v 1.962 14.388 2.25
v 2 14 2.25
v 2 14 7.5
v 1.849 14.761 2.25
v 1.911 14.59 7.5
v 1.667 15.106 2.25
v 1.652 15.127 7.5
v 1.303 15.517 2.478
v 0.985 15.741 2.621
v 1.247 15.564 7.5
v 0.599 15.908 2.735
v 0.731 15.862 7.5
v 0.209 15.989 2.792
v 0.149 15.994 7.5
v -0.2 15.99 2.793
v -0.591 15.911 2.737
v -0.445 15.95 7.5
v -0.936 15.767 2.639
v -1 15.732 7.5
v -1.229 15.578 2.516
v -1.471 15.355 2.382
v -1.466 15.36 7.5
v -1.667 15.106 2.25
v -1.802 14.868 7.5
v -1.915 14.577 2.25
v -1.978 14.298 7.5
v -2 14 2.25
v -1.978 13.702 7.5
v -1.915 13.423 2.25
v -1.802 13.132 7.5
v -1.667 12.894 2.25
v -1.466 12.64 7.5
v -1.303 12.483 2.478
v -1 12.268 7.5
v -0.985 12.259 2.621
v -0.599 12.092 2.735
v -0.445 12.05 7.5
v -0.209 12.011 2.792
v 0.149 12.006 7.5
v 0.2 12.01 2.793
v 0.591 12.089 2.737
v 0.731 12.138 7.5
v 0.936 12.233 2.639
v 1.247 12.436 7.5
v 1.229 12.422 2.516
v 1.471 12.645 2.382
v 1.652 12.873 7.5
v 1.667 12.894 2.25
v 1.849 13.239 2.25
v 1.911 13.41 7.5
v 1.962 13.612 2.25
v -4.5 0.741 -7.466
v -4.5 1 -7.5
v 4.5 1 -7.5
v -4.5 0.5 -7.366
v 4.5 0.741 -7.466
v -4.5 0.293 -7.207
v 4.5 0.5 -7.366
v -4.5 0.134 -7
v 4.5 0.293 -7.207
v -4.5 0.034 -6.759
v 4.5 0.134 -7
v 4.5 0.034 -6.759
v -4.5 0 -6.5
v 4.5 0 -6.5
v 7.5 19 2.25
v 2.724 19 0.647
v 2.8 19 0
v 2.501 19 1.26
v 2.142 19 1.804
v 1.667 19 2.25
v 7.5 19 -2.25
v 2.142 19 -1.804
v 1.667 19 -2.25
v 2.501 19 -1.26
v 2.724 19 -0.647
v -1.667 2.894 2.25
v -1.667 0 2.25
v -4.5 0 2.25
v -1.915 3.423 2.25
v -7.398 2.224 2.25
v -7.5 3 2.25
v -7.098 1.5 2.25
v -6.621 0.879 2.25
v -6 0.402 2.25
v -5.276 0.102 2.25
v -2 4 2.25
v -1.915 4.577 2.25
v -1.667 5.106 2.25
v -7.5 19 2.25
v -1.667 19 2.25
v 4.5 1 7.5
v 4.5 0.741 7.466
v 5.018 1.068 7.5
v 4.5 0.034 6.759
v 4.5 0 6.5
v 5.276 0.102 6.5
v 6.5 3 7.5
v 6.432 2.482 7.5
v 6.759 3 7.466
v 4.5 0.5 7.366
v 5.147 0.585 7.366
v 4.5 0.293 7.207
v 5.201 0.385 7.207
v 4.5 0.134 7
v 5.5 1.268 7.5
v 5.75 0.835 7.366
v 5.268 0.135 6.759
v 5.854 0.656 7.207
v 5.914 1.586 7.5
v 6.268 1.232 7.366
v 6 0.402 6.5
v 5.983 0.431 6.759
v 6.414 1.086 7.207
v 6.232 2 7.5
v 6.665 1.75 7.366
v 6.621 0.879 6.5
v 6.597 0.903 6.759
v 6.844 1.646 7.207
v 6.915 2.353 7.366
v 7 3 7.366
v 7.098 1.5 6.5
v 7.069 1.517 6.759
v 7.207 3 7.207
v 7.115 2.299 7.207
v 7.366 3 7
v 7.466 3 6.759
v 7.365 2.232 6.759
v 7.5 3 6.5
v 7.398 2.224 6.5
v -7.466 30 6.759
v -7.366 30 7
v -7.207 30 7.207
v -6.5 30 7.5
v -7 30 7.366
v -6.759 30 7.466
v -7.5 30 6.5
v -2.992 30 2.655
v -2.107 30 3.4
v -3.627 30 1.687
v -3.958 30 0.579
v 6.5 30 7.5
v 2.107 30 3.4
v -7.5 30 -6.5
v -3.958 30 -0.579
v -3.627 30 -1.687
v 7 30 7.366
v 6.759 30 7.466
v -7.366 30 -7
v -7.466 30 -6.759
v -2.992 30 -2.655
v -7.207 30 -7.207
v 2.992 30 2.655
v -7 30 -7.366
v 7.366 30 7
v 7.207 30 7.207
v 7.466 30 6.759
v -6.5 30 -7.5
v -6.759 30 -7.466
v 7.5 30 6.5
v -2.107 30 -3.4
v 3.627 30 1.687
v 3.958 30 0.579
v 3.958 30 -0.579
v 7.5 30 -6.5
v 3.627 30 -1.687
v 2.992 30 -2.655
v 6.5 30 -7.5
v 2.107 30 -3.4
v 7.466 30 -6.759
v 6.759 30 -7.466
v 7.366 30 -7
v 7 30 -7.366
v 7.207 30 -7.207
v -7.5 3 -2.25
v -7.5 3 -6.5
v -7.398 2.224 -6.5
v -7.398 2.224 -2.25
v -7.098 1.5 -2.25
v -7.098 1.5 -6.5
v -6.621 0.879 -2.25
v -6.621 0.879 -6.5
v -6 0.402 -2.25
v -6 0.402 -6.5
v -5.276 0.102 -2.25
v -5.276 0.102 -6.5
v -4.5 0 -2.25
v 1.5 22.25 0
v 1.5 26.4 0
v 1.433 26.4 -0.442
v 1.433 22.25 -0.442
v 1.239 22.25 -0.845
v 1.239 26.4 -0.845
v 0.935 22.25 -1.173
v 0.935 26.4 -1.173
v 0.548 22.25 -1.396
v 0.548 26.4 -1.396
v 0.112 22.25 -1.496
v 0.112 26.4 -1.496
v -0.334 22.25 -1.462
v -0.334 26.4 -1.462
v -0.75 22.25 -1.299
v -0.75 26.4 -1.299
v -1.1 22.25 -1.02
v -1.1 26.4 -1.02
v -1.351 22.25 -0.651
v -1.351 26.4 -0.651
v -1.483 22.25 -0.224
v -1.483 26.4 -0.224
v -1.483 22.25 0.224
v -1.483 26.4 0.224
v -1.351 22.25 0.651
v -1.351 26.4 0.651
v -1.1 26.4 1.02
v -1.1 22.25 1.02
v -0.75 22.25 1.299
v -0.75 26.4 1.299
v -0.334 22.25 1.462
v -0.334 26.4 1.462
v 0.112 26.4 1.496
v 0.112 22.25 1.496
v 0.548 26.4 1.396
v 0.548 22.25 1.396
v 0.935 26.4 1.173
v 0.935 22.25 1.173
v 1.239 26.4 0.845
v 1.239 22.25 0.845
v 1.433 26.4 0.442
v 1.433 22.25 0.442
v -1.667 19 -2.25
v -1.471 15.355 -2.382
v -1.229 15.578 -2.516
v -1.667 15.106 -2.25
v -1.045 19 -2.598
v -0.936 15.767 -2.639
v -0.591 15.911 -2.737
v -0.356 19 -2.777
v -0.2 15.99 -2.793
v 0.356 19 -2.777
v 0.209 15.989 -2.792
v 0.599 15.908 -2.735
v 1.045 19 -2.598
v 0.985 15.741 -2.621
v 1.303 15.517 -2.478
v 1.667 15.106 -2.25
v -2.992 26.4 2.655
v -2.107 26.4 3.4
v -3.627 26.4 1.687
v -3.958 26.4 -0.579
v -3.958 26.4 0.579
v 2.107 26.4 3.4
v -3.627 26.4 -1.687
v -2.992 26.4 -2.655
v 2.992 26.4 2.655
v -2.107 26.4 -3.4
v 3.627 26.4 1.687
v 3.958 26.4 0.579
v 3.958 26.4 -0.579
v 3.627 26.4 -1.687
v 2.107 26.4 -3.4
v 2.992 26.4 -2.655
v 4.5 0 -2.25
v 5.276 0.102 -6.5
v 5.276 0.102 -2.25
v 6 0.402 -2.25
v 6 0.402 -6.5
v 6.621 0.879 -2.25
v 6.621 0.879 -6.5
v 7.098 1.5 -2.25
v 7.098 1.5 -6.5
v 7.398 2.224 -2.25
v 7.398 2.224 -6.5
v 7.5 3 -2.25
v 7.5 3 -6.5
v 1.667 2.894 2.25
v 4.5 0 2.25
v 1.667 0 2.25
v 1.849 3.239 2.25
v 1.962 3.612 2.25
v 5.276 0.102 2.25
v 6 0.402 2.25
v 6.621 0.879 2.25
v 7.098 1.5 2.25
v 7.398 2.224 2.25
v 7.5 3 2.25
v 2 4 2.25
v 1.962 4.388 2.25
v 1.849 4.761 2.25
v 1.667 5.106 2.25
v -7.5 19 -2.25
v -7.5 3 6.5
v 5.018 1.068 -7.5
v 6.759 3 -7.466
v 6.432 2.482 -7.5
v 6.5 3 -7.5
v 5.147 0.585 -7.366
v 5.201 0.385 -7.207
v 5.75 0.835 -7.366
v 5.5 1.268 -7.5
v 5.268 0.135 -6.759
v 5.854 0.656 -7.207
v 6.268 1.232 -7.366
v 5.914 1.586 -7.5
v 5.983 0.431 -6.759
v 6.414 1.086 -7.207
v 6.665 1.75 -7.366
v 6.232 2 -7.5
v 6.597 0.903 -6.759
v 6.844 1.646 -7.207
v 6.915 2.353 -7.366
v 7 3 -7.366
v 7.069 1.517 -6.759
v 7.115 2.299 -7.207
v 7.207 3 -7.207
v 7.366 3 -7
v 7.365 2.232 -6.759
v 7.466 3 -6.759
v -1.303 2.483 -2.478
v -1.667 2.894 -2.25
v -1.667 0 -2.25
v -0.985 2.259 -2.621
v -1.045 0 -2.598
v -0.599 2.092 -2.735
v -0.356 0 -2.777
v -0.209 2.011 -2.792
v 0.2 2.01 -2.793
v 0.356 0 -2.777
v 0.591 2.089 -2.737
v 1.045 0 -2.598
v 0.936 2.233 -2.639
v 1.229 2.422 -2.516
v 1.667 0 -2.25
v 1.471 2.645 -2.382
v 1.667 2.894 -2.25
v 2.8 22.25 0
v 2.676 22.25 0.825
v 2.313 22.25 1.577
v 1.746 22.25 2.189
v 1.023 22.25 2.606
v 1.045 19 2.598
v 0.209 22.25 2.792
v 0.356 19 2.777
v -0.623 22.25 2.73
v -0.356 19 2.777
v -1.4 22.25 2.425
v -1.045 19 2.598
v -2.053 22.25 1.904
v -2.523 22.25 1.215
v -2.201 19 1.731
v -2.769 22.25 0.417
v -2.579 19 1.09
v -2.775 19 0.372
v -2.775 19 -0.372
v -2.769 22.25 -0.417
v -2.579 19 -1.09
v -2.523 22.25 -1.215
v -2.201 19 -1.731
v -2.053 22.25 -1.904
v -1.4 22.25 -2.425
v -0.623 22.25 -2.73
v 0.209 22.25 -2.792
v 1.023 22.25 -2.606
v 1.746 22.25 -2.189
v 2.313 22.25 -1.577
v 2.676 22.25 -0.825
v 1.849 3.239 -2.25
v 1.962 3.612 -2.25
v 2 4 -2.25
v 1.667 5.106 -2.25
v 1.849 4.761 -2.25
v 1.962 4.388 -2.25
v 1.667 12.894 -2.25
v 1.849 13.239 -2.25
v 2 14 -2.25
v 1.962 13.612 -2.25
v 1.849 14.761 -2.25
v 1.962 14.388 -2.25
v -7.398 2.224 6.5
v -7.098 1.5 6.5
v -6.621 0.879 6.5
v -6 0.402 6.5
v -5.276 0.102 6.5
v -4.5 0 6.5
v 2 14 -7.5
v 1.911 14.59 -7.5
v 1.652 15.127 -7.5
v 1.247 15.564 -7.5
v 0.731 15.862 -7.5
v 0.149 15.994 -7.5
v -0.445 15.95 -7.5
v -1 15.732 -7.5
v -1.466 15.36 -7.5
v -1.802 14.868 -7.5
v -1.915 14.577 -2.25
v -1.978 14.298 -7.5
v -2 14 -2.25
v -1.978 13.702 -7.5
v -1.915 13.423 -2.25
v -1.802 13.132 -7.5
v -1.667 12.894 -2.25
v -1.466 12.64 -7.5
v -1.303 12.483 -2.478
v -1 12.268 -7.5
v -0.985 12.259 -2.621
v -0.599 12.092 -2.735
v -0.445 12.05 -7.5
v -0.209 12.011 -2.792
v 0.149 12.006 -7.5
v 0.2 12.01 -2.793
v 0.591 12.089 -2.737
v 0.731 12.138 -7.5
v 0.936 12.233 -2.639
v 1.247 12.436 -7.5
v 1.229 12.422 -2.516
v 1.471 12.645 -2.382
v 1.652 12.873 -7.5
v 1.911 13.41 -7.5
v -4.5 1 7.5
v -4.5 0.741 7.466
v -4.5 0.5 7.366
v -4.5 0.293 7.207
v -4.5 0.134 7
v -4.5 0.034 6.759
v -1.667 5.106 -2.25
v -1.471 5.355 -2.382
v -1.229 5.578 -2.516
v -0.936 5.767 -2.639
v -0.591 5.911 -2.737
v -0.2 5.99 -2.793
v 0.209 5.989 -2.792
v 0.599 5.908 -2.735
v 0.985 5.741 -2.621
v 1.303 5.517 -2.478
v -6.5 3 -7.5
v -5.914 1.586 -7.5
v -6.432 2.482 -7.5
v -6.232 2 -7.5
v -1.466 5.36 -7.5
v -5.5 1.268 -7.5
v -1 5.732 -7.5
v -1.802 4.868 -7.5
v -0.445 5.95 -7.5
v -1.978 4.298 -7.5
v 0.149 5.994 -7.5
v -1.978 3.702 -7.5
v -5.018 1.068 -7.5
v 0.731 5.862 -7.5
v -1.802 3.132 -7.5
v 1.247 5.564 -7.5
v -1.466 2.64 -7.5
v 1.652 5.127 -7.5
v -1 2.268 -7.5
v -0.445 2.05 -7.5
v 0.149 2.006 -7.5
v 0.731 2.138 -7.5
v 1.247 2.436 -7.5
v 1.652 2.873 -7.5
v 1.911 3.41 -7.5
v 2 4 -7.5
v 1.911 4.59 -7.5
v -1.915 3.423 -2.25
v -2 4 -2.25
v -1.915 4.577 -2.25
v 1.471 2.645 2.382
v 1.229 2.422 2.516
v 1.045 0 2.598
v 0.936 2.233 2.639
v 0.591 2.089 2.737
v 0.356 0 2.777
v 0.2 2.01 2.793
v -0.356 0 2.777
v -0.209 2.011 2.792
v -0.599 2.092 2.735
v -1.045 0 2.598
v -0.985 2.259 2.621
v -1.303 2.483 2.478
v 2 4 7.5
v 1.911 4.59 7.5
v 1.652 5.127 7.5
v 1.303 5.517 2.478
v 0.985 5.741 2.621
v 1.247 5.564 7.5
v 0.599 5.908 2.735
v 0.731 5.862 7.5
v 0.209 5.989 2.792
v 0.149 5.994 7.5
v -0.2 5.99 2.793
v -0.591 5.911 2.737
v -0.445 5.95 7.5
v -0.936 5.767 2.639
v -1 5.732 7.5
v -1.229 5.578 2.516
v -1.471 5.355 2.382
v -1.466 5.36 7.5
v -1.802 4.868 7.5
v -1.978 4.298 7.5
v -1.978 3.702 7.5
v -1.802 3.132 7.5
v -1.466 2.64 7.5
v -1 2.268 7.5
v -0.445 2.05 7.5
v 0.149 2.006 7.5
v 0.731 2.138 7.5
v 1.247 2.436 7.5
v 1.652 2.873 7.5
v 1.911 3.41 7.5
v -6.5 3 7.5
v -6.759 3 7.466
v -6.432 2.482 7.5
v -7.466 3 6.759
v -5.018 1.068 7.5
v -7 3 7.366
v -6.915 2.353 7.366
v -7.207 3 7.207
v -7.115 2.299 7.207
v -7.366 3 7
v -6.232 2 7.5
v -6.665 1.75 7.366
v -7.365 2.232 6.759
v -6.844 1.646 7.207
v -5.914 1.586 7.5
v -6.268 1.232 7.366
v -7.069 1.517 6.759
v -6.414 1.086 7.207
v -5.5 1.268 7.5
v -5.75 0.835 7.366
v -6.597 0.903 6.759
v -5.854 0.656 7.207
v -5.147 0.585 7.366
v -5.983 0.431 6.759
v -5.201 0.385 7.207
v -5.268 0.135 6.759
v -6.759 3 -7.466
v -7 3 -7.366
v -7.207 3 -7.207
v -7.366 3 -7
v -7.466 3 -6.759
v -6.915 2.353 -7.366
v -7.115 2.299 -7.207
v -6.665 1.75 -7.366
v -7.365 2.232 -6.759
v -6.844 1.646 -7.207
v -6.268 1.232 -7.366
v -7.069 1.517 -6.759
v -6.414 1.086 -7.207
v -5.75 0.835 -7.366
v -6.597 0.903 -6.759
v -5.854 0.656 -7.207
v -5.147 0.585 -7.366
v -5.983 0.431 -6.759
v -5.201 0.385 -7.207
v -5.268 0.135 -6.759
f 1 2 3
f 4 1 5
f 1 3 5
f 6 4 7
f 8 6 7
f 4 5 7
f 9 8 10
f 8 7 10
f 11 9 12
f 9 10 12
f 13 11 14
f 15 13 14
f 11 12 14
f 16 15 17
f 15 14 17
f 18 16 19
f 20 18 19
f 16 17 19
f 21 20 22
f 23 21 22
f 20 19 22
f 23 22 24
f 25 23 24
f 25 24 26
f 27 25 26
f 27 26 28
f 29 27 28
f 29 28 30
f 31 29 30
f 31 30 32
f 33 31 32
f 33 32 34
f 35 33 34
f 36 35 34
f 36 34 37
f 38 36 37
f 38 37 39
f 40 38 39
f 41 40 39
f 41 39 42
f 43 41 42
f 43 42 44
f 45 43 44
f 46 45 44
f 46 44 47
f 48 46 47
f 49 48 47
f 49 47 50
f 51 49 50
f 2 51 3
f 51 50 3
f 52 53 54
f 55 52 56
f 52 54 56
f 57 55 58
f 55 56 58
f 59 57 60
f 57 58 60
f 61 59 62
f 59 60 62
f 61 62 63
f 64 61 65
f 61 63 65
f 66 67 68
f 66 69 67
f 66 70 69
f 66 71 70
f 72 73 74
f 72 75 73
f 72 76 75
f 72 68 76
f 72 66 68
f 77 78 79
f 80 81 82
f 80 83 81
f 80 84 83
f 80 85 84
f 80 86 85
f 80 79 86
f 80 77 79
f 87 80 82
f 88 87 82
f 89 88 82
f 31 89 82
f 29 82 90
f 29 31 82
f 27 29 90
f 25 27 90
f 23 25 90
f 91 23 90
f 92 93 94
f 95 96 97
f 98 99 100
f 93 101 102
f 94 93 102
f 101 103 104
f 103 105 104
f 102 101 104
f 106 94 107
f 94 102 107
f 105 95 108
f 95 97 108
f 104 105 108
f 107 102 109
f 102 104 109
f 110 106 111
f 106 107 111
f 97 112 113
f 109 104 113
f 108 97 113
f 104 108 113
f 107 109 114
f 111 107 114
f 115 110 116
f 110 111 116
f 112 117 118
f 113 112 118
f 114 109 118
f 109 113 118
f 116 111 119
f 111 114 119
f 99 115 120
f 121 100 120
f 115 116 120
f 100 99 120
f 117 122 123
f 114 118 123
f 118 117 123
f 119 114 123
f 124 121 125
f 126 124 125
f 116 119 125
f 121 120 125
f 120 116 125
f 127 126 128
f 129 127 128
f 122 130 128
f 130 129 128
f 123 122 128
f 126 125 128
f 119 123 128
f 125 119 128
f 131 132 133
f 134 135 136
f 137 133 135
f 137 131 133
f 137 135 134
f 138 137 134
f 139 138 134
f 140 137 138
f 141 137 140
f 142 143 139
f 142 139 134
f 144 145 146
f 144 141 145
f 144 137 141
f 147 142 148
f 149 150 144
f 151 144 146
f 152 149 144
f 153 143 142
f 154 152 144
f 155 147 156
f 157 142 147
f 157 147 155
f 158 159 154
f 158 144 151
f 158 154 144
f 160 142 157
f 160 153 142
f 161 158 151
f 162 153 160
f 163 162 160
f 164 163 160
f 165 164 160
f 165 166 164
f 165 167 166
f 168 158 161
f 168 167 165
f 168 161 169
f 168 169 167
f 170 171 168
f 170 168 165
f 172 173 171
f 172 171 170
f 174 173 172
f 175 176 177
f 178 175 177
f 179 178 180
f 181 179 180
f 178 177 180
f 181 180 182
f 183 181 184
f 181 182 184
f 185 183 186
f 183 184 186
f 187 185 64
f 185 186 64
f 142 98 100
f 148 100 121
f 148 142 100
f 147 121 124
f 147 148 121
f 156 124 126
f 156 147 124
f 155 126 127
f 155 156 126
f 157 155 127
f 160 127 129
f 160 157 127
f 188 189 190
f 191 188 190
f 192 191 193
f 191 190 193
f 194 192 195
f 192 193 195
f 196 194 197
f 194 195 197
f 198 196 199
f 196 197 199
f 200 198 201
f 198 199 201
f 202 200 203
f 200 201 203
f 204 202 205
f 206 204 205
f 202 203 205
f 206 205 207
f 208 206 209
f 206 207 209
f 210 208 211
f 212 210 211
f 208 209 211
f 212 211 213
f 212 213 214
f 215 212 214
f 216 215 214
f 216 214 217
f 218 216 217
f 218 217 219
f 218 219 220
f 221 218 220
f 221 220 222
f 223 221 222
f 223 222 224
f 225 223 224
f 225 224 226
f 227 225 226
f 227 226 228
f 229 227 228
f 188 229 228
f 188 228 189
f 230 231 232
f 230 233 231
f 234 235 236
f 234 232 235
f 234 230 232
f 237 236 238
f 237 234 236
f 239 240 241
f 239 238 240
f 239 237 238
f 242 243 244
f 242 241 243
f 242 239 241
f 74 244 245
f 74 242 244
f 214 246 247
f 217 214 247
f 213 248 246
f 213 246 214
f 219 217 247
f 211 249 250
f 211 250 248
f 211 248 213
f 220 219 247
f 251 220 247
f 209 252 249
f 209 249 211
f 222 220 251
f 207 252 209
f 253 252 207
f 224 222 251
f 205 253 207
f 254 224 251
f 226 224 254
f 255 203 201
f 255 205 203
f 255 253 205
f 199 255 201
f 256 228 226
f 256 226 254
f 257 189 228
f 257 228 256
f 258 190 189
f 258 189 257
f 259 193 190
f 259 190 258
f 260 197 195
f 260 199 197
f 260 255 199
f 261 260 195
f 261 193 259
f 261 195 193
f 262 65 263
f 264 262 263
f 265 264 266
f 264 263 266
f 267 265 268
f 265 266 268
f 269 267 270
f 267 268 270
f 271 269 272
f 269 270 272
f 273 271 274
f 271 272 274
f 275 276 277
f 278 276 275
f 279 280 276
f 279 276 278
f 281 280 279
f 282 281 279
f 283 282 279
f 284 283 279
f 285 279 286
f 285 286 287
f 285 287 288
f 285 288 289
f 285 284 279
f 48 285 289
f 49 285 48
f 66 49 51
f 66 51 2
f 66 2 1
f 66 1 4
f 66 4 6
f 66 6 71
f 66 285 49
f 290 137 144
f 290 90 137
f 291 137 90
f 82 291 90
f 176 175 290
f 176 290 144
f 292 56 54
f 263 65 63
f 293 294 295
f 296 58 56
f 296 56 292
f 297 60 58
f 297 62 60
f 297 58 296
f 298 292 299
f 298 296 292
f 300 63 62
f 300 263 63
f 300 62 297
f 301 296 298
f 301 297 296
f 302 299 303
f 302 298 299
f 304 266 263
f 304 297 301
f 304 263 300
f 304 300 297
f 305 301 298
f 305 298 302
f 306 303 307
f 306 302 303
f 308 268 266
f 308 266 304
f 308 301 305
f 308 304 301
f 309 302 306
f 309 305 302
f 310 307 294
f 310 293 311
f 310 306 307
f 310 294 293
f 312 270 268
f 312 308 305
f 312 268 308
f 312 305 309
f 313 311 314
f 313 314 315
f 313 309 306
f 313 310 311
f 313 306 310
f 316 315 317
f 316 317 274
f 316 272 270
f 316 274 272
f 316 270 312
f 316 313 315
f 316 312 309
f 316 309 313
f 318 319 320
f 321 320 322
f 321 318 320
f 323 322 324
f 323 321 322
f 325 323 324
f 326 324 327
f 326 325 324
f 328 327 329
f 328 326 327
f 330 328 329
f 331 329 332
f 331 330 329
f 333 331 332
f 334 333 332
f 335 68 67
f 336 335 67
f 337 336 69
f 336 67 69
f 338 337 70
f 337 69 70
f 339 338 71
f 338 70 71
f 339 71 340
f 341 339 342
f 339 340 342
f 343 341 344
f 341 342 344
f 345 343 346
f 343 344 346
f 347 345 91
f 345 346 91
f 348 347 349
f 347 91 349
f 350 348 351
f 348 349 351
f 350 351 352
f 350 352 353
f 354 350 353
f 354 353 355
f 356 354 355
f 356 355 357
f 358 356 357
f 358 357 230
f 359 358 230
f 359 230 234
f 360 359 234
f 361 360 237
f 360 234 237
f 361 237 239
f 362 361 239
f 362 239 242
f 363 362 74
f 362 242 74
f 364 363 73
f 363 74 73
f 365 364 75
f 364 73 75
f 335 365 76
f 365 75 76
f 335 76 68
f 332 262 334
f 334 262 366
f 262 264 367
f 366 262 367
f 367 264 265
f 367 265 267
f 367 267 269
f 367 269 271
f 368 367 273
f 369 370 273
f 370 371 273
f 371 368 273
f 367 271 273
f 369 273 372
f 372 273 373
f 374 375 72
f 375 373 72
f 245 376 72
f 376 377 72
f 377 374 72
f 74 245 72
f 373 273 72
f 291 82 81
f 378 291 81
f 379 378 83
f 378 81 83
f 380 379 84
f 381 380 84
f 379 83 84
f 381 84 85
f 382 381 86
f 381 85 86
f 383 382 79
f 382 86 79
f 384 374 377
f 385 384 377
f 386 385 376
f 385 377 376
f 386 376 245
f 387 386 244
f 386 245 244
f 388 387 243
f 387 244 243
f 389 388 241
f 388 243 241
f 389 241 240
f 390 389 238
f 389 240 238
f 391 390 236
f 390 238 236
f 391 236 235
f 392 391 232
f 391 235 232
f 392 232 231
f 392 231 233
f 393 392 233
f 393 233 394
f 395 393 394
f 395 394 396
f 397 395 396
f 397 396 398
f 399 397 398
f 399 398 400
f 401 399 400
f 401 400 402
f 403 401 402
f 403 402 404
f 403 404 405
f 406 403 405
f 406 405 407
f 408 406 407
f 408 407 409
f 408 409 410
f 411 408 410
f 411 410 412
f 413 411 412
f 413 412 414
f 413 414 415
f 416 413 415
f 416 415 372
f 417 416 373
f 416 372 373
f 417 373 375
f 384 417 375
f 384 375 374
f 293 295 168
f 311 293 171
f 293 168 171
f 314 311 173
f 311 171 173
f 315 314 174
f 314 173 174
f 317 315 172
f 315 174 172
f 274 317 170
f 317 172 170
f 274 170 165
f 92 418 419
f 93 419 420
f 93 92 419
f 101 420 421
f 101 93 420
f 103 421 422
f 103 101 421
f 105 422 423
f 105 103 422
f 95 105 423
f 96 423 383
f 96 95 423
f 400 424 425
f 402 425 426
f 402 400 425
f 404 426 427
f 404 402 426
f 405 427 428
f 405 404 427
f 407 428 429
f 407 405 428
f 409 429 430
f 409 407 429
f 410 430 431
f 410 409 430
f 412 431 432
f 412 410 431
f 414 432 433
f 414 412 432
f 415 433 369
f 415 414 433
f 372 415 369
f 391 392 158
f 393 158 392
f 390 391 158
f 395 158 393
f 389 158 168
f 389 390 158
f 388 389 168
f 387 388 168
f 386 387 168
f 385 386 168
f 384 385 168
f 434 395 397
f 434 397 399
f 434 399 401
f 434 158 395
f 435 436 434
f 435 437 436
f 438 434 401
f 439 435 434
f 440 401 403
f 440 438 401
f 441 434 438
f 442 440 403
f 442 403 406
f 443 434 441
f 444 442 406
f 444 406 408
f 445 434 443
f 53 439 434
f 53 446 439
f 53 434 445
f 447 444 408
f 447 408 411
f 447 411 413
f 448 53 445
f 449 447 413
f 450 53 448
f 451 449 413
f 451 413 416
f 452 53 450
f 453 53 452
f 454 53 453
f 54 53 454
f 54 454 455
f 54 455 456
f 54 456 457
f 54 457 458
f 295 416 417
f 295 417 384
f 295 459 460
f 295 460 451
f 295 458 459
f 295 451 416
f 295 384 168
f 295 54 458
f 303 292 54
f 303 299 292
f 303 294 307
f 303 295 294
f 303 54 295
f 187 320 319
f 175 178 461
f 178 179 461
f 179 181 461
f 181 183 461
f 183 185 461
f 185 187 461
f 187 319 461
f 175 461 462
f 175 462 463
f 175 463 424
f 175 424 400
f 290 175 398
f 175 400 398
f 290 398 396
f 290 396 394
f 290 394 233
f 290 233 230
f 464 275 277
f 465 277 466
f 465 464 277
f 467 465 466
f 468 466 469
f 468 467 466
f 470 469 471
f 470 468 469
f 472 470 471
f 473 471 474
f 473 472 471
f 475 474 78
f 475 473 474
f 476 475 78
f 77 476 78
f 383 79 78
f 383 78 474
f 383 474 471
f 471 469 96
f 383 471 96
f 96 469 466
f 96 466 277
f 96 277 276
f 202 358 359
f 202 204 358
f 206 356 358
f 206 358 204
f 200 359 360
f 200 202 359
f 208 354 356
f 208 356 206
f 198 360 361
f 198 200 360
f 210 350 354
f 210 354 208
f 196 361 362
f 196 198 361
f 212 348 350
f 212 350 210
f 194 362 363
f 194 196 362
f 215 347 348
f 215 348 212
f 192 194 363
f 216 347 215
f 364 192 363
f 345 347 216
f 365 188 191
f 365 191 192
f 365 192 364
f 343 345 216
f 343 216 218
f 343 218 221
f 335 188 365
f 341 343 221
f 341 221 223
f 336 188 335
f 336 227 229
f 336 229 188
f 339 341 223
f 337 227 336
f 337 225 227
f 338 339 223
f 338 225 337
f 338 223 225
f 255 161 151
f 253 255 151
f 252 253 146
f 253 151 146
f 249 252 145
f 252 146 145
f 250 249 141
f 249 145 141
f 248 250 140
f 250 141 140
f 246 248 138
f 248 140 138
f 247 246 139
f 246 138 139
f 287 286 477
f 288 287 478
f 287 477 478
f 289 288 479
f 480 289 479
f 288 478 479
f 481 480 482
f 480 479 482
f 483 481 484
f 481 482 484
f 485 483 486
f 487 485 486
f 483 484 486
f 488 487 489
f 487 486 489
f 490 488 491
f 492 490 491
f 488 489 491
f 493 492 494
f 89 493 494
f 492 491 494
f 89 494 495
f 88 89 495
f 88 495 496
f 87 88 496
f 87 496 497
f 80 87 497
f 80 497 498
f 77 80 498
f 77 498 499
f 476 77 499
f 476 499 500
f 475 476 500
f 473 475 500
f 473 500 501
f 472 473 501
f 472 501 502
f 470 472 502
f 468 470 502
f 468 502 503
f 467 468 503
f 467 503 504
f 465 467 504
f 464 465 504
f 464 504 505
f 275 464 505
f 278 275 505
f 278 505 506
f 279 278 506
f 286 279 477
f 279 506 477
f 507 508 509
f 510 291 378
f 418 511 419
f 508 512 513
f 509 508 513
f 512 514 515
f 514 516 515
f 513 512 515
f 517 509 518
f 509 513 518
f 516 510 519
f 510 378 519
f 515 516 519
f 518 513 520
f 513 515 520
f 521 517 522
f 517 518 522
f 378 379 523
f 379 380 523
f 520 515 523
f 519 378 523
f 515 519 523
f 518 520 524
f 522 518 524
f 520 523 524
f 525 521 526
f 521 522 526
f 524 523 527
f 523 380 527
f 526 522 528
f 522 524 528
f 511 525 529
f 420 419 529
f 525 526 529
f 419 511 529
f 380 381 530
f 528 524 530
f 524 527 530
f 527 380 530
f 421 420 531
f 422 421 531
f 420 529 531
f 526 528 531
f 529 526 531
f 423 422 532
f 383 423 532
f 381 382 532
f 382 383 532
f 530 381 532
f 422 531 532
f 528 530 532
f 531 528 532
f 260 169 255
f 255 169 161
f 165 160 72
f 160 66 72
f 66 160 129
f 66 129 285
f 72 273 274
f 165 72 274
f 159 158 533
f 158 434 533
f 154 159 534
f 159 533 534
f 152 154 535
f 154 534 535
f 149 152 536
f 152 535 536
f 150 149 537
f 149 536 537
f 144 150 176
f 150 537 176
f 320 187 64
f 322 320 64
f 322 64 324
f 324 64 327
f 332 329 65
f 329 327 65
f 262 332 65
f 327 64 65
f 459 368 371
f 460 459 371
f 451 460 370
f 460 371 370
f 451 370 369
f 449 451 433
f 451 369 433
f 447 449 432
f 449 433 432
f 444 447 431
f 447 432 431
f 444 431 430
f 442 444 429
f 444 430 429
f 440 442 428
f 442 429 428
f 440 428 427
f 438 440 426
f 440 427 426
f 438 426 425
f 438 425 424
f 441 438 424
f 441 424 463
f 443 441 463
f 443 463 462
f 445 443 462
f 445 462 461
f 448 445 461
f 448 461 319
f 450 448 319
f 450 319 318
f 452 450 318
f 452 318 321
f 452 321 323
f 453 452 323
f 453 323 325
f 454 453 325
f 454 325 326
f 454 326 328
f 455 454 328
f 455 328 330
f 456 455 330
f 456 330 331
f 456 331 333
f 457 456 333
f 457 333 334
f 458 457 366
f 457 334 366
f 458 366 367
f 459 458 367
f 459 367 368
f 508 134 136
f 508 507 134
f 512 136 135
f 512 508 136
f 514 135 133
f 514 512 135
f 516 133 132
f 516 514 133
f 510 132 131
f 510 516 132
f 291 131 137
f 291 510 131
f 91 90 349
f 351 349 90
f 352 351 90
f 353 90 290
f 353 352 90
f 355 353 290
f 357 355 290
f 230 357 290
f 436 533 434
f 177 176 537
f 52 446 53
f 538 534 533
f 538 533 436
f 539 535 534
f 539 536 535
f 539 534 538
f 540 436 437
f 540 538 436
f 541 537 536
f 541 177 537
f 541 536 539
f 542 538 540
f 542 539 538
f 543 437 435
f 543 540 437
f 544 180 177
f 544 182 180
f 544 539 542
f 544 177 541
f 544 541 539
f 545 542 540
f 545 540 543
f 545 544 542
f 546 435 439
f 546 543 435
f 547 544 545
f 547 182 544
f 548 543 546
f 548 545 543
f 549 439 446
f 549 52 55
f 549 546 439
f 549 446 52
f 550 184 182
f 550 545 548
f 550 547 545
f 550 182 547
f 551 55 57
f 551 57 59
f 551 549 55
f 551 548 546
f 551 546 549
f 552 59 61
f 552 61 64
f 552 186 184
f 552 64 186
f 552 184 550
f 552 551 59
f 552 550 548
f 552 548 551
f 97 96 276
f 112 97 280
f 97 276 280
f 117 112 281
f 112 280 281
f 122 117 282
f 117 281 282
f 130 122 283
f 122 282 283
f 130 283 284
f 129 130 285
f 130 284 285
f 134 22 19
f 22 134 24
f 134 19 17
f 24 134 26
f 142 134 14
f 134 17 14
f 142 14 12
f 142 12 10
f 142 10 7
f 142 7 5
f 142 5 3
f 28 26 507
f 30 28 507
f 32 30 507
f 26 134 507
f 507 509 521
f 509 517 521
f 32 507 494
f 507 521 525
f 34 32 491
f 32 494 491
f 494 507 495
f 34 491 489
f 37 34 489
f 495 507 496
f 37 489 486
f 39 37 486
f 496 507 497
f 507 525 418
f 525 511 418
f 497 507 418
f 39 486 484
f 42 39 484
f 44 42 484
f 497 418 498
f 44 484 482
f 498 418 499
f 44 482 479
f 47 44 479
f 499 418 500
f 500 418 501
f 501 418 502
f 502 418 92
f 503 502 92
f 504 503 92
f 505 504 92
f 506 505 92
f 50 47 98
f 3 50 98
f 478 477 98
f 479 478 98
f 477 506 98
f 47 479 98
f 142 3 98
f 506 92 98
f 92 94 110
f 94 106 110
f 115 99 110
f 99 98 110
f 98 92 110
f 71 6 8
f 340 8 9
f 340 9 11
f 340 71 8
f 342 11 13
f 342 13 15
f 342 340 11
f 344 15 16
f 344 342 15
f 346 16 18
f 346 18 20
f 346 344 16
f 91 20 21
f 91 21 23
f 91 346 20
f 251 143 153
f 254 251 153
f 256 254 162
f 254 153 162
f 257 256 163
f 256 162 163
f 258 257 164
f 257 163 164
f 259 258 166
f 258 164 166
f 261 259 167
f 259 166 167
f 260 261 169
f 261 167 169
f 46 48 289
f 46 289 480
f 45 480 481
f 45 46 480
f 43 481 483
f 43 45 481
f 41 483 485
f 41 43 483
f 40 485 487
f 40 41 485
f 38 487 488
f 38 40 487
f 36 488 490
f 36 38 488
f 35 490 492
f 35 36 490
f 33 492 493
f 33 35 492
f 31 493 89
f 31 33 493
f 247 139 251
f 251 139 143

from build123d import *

# Parameters (mm, degrees)
SKETCH2_W               = 15
SKETCH2_H               = 15
BOSS_EXTRUDE3_DEPTH     = 30
SKETCH1_R               = 2
CUT_EXTRUDE1_DEPTH      = 16
SKETCH3_W               = 4.5
SKETCH3_H               = 19
CUT_EXTRUDE2_DEPTH      = 8.5
CUT_EXTRUDE2_DEPTH_BACK = 8.5
SKETCH5_R               = 1.5
CUT_EXTRUDE3_DEPTH      = 3.6
SKETCH5_2_R             = 1.5
CUT_EXTRUDE4_DEPTH      = 31
FILLET3_R               = 3
FILLET1_R               = 1
SKETCH6_R               = 2.8
CUT_EXTRUDE5_DEPTH      = 20
CUT_EXTRUDE5_DEPTH_BACK = 3.25


with BuildPart() as part:
    # Sketch2 → Boss-Extrude3 (new body)
    with BuildSketch(Plane(origin=(0, 0, 0), x_dir=(1, 0, 0), z_dir=(0, 1, 0))):
        Rectangle(SKETCH2_W, SKETCH2_H)
    extrude(amount=BOSS_EXTRUDE3_DEPTH)

    # Sketch1 → Cut-Extrude1 (cut, through all)
    with BuildSketch(Plane.XY.offset(7.5)):
        with Locations((0, 4)):
            Circle(SKETCH1_R)
        with Locations((0, 14)):
            Circle(SKETCH1_R)
    extrude(amount=-CUT_EXTRUDE1_DEPTH, mode=Mode.SUBTRACT)

    # Sketch3 → Cut-Extrude2 (cut, two sides)
    with BuildSketch(Plane(origin=(0, 0, 0), x_dir=(0, 0, -1), z_dir=(1, 0, 0))) as cut_extrude2_sk:
        with Locations((0, 9.5)):
            Rectangle(SKETCH3_W, SKETCH3_H)
    extrude(amount=CUT_EXTRUDE2_DEPTH, mode=Mode.SUBTRACT)
    extrude(cut_extrude2_sk.sketch, amount=-CUT_EXTRUDE2_DEPTH_BACK, mode=Mode.SUBTRACT)

    # Sketch5 → Cut-Extrude3 (cut)
    with BuildSketch(Plane(origin=(0, 30, 0), x_dir=(1, 0, 0), z_dir=(0, 1, 0))):
        with BuildLine():
            Line((-2.107130751, -3.4), (2.107130751, -3.4))
            ThreePointArc((2.107130751, -3.4), (4, 0), (2.107130751, 3.4))
            Line((2.107130751, 3.4), (-2.107130751, 3.4))
            ThreePointArc((-2.107130751, 3.4), (-4, 0), (-2.107130751, -3.4))
        make_face()
        Circle(SKETCH5_R, mode=Mode.SUBTRACT)
    extrude(amount=-CUT_EXTRUDE3_DEPTH, mode=Mode.SUBTRACT)

    # Sketch5<2> → Cut-Extrude4 (cut, through all)
    with BuildSketch(Plane(origin=(0, 30, 0), x_dir=(1, 0, 0), z_dir=(0, 1, 0))):
        Circle(SKETCH5_2_R)
    extrude(amount=-CUT_EXTRUDE4_DEPTH, mode=Mode.SUBTRACT)

    # Fillet3
    fillet3_edges = [part.edges().sort_by_distance(p)[0] for p in [
        (7.5, 0, -4.875),
        (-7.5, 0, 4.875),
        (-7.5, 0, -4.875),
        (7.5, 0, 4.875),
    ]]
    fillet(fillet3_edges, radius=FILLET3_R)

    # Fillet1
    fillet1_edges = [part.edges().sort_by_distance(p)[0] for p in [
        (0, 0, -7.5),
        (6.621320344, 0.878679656, -7.5),
        (-6.621320344, 0.878679656, -7.5),
        (7.5, 16.5, 7.5),
        (-7.5, 16.5, 7.5),
        (0, 0, 7.5),
        (-7.5, 16.5, -7.5),
        (7.5, 16.5, -7.5),
        (-6.621320344, 0.878679656, 7.5),
        (6.621320344, 0.878679656, 7.5),
    ]]
    fillet(fillet1_edges, radius=FILLET1_R)

    # Sketch6 → Cut-Extrude5 (cut, two sides)
    with BuildSketch(Plane.XZ.offset(-19)) as cut_extrude5_sk:
        Circle(SKETCH6_R)
    extrude(amount=CUT_EXTRUDE5_DEPTH, mode=Mode.SUBTRACT)
    extrude(cut_extrude5_sk.sketch, amount=-CUT_EXTRUDE5_DEPTH_BACK, mode=Mode.SUBTRACT)


solid = part.part
